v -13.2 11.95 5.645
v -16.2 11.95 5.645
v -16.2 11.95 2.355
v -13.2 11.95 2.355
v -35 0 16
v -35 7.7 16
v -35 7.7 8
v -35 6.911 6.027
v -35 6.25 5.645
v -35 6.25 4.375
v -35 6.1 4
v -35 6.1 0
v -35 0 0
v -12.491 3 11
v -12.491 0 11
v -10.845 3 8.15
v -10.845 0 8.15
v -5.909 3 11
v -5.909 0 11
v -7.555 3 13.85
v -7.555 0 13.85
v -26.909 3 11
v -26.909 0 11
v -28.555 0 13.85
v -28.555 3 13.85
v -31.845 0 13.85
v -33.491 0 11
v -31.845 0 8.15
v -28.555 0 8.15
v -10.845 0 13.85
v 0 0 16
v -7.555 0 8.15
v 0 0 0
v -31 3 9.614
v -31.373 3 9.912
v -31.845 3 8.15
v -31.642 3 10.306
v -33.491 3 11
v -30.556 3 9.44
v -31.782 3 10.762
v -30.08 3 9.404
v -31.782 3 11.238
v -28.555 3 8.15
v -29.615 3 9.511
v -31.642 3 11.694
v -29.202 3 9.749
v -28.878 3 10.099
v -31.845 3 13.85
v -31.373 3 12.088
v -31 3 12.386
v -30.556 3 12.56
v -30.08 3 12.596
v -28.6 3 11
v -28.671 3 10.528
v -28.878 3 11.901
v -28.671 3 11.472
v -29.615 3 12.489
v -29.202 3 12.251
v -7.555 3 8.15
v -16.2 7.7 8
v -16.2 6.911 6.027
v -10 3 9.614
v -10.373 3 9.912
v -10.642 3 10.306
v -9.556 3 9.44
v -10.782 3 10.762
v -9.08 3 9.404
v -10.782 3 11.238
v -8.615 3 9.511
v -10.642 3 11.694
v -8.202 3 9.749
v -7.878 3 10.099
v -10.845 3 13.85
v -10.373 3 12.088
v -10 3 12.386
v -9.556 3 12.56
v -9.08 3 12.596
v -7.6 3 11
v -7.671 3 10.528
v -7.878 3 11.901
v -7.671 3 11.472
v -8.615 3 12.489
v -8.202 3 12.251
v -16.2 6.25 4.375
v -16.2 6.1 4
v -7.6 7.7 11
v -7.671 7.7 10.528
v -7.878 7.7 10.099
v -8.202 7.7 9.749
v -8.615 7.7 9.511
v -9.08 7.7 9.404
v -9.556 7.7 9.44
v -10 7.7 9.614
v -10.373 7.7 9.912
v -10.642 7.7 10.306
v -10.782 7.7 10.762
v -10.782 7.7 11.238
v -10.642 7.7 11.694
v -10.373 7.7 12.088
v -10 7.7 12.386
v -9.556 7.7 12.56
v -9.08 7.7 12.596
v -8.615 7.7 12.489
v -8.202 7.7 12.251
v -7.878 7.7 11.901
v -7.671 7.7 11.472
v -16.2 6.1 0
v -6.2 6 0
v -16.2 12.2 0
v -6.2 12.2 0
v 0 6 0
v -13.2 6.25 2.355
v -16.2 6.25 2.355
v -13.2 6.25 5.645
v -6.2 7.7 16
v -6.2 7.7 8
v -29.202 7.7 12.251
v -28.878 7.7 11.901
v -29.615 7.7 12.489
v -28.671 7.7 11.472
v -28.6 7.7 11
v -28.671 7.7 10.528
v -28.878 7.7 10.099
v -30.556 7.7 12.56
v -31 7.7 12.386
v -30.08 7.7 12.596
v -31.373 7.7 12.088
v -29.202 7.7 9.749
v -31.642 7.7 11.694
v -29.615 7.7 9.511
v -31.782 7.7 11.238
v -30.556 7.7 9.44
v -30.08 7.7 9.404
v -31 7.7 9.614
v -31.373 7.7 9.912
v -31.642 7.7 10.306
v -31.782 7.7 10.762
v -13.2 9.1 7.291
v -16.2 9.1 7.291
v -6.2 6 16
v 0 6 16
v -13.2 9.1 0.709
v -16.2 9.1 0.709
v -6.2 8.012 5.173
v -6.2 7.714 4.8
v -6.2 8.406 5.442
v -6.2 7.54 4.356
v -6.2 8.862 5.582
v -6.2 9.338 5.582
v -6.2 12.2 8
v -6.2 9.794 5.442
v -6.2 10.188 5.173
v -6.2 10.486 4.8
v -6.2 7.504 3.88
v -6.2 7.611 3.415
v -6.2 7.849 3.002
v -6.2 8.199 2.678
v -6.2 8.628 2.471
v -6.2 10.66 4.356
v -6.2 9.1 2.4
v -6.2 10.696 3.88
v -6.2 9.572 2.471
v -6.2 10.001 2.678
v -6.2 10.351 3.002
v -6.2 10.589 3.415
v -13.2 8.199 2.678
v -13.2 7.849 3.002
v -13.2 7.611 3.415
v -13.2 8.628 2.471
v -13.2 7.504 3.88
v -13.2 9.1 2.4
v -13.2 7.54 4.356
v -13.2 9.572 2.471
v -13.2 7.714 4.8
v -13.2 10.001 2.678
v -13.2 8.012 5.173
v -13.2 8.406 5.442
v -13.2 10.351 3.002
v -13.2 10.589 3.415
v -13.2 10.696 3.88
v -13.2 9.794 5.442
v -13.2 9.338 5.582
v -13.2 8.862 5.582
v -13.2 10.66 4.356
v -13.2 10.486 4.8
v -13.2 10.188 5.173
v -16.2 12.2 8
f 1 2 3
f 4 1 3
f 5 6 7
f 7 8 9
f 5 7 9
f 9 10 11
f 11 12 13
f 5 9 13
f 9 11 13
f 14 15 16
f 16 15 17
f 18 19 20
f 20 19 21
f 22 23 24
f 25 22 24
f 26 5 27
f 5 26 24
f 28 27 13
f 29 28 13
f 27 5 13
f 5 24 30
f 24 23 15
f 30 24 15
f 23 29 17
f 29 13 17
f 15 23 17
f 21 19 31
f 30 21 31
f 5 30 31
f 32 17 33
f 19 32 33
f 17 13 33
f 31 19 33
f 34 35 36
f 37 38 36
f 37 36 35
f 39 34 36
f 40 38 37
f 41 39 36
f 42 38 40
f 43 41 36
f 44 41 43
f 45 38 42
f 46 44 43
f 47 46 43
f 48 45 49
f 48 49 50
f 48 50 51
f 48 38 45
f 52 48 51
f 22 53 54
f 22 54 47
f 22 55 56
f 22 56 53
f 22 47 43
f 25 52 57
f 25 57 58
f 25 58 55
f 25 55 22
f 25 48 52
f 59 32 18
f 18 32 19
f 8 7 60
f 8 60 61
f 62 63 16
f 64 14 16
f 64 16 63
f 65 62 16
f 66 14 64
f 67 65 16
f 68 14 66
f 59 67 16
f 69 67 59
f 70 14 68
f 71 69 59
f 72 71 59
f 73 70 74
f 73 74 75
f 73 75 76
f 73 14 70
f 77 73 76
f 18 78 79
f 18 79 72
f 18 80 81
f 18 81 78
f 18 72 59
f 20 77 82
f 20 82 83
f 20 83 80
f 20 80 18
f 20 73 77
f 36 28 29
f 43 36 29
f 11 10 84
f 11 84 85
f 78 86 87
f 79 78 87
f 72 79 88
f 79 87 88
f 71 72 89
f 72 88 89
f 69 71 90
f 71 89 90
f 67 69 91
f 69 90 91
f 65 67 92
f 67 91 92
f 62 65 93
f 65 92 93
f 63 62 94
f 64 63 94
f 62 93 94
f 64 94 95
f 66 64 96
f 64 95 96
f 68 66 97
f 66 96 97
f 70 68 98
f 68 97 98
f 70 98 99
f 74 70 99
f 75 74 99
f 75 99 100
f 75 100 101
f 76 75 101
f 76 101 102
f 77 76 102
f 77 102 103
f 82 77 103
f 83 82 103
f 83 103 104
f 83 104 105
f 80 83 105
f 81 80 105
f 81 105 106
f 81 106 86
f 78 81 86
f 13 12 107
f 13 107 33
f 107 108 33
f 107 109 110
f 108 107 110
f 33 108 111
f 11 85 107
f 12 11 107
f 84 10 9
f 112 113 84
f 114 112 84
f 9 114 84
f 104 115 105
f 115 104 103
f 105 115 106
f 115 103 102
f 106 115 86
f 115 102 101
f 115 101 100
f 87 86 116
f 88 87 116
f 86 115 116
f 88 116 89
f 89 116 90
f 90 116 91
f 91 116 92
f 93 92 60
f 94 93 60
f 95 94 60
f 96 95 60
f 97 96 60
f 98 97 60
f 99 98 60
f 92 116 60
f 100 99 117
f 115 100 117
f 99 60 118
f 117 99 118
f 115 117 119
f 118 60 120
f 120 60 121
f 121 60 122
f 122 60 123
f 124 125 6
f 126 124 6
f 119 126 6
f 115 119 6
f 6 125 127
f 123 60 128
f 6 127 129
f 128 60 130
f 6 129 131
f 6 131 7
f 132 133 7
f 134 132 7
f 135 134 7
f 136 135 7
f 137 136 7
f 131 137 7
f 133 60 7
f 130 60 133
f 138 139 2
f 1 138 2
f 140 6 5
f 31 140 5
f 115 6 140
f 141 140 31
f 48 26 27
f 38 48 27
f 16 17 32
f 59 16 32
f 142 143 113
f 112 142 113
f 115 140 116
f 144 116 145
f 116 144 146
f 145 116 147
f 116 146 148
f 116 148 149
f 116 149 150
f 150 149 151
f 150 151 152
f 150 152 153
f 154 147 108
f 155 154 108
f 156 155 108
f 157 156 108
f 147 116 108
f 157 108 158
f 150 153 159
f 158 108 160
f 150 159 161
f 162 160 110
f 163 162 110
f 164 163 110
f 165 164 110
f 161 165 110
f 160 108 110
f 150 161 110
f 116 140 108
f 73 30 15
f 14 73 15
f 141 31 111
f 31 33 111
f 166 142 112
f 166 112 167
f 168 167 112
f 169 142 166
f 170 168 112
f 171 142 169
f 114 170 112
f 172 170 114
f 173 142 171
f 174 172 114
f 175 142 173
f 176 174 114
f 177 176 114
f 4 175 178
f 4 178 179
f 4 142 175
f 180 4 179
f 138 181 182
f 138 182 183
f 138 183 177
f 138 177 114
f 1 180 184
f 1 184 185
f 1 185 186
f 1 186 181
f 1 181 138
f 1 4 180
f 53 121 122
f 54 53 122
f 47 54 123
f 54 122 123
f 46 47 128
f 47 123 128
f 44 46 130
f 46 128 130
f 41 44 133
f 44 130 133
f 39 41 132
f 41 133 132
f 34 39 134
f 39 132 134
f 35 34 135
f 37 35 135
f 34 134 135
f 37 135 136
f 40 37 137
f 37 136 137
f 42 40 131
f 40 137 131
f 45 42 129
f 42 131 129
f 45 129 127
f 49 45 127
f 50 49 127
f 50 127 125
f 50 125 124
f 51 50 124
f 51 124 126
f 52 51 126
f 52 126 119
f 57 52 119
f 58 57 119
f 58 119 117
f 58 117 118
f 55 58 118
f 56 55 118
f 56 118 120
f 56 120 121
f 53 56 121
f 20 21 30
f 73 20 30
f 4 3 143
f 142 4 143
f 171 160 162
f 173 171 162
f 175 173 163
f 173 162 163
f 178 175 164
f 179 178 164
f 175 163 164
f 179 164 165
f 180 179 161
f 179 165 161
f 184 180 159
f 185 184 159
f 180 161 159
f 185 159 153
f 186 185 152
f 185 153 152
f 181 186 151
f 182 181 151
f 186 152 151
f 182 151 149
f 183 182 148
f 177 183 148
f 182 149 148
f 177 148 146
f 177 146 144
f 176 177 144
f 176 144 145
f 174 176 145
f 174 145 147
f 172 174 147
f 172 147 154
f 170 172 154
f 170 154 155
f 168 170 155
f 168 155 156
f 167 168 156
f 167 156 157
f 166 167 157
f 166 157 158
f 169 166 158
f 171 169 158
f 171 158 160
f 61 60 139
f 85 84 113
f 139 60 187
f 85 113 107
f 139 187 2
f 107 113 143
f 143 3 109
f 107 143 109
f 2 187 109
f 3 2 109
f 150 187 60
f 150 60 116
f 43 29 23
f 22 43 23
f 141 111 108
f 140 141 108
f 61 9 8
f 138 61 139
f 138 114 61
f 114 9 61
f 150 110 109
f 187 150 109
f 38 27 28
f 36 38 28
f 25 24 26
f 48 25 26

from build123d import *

# Parameters (mm, degrees)
SALIENTE_EXTRUIR1_DEPTH           = 8
SALIENTE_EXTRUIR2_DEPTH           = 8
CORTAR_EXTRUIR1_REACH             = 30.8
CROQUIS3_R                        = 1.6
CORTAR_EXTRUIR2_REACH             = 9.7
CROQUIS4_R                        = 1.6
CORTAR_EXTRUIR3_DEPTH             = 3
CORTAR_EXTRUIR4_DEPTH             = 18.8
CORTAR_EXTRUIR5_DEPTH             = 3
CORTAR_EXTRUIR5_DIRECTION_2_REACH = 20.8


with BuildPart() as part:
    # Croquis1 → Saliente-Extruir1 (new body)
    with BuildSketch(Plane.XY):
        Polygon((0, 0), (0, 6), (-6.2, 6), (-6.2, 12.2), (-35, 12.2), (-35, 0), align=None)
    extrude(amount=SALIENTE_EXTRUIR1_DEPTH)

    # Croquis2 → Saliente-Extruir2 (add)
    with BuildSketch(Plane.XY.offset(8)):
        Polygon((-6.2, 7.7), (-35, 7.7), (-35, 0), (0, 0), (0, 6), (-6.2, 6), align=None)
    extrude(amount=SALIENTE_EXTRUIR2_DEPTH)

    # Croquis3 → Cortar-Extruir1 (cut, up to next)
    with BuildSketch(Plane(origin=(-6.2, 0, 0), x_dir=(0, 0, -1), z_dir=(1, 0, 0)), mode=Mode.PRIVATE) as cortar_extruir1_sk1:
        with Locations((-4, 9.1)):
            Circle(CROQUIS3_R)
    cortar_extruir1_tool1 = extrude(cortar_extruir1_sk1.sketch, amount=-CORTAR_EXTRUIR1_REACH, mode=Mode.PRIVATE) & part.part
    add(cortar_extruir1_tool1.solids().sort_by_distance((-6.2, 9.1, 4))[0], mode=Mode.SUBTRACT)

    # Croquis4 → Cortar-Extruir2 (cut, up to next)
    with BuildSketch(Plane(origin=(0, 7.7, 0), x_dir=(1, 0, 0), z_dir=(0, 1, 0)), mode=Mode.PRIVATE) as cortar_extruir2_sk1:
        with Locations((-30.2, -11)):
            Circle(CROQUIS4_R)
    cortar_extruir2_tool1 = extrude(cortar_extruir2_sk1.sketch, amount=-CORTAR_EXTRUIR2_REACH, mode=Mode.PRIVATE) & part.part
    add(cortar_extruir2_tool1.solids().sort_by_distance((-30.2, 7.7, 11))[0], mode=Mode.SUBTRACT)
    # Croquis4 → Cortar-Extruir2 (cut, up to next)
    with BuildSketch(Plane(origin=(0, 7.7, 0), x_dir=(1, 0, 0), z_dir=(0, 1, 0)), mode=Mode.PRIVATE) as cortar_extruir2_sk2:
        with Locations((-9.2, -11)):
            Circle(CROQUIS4_R)
    cortar_extruir2_tool2 = extrude(cortar_extruir2_sk2.sketch, amount=-CORTAR_EXTRUIR2_REACH, mode=Mode.PRIVATE) & part.part
    add(cortar_extruir2_tool2.solids().sort_by_distance((-9.2, 7.7, 11))[0], mode=Mode.SUBTRACT)

    # Croquis5 → Cortar-Extruir3 (cut)
    with BuildSketch(Plane.XZ):
        Polygon((-33.490896534, 11), (-31.845448267, 8.15), (-28.554551733, 8.15), (-26.909103466, 11), (-28.554551733, 13.85), (-31.845448267, 13.85), align=None)
        Polygon((-12.490896534, 11), (-10.845448267, 8.15), (-7.554551733, 8.15), (-5.909103466, 11), (-7.554551733, 13.85), (-10.845448267, 13.85), align=None)
    extrude(amount=-CORTAR_EXTRUIR3_DEPTH, mode=Mode.SUBTRACT)

    # Croquis6 → Cortar-Extruir4 (cut)
    with BuildSketch(Plane.ZY.offset(35)):
        Polygon((8, 7.7), (4, 6.1), (0, 6.1), (0, 12.2), (8, 12.2), align=None)
    extrude(amount=-CORTAR_EXTRUIR4_DEPTH, mode=Mode.SUBTRACT)

    # Croquis7 → Cortar-Extruir5 (cut)
    with BuildSketch(Plane.ZY.offset(16.2)):
        Polygon((0.709103466, 9.1), (2.354551733, 6.25), (5.645448267, 6.25), (7.290896534, 9.1), (5.645448267, 11.95), (2.354551733, 11.95), align=None)
    extrude(amount=-CORTAR_EXTRUIR5_DEPTH, mode=Mode.SUBTRACT)

    # Croquis7 → Cortar-Extruir5 direction 2 (cut, up to next)
    with BuildSketch(Plane.ZY.offset(16.2), mode=Mode.PRIVATE) as cortar_extruir5_direction_2_sk1:
        Polygon((0.709103466, 9.1), (2.354551733, 6.25), (5.645448267, 6.25), (7.290896534, 9.1), (5.645448267, 11.95), (2.354551733, 11.95), align=None)
    cortar_extruir5_direction_2_tool1 = extrude(cortar_extruir5_direction_2_sk1.sketch, amount=CORTAR_EXTRUIR5_DIRECTION_2_REACH, mode=Mode.PRIVATE) & part.part
    add(cortar_extruir5_direction_2_tool1.solids().sort_by_distance((-16.2, 9.1, 4))[0], mode=Mode.SUBTRACT)


solid = part.part
